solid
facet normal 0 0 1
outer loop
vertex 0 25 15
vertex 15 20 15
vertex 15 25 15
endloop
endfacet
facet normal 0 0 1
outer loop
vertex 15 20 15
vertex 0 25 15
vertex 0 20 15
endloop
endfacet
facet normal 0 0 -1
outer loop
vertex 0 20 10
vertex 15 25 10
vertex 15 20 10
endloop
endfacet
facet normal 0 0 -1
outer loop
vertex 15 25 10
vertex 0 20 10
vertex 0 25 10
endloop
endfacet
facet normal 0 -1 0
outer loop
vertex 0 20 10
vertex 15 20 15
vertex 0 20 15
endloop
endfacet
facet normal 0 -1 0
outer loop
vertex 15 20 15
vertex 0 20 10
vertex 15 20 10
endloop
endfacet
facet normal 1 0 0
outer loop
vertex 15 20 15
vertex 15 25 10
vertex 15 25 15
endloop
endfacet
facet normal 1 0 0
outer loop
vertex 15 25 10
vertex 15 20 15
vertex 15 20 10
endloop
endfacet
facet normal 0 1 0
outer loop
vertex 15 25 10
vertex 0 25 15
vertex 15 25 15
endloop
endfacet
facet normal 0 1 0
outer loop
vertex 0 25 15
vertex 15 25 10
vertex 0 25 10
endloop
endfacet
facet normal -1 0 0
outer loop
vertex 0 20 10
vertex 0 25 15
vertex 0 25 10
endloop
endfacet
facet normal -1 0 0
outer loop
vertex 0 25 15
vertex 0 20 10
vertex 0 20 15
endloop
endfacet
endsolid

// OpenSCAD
// Generated by generate_scads.py
translate([0,20,10]) {
  cube(size=[15,5,5], center=false);
}
